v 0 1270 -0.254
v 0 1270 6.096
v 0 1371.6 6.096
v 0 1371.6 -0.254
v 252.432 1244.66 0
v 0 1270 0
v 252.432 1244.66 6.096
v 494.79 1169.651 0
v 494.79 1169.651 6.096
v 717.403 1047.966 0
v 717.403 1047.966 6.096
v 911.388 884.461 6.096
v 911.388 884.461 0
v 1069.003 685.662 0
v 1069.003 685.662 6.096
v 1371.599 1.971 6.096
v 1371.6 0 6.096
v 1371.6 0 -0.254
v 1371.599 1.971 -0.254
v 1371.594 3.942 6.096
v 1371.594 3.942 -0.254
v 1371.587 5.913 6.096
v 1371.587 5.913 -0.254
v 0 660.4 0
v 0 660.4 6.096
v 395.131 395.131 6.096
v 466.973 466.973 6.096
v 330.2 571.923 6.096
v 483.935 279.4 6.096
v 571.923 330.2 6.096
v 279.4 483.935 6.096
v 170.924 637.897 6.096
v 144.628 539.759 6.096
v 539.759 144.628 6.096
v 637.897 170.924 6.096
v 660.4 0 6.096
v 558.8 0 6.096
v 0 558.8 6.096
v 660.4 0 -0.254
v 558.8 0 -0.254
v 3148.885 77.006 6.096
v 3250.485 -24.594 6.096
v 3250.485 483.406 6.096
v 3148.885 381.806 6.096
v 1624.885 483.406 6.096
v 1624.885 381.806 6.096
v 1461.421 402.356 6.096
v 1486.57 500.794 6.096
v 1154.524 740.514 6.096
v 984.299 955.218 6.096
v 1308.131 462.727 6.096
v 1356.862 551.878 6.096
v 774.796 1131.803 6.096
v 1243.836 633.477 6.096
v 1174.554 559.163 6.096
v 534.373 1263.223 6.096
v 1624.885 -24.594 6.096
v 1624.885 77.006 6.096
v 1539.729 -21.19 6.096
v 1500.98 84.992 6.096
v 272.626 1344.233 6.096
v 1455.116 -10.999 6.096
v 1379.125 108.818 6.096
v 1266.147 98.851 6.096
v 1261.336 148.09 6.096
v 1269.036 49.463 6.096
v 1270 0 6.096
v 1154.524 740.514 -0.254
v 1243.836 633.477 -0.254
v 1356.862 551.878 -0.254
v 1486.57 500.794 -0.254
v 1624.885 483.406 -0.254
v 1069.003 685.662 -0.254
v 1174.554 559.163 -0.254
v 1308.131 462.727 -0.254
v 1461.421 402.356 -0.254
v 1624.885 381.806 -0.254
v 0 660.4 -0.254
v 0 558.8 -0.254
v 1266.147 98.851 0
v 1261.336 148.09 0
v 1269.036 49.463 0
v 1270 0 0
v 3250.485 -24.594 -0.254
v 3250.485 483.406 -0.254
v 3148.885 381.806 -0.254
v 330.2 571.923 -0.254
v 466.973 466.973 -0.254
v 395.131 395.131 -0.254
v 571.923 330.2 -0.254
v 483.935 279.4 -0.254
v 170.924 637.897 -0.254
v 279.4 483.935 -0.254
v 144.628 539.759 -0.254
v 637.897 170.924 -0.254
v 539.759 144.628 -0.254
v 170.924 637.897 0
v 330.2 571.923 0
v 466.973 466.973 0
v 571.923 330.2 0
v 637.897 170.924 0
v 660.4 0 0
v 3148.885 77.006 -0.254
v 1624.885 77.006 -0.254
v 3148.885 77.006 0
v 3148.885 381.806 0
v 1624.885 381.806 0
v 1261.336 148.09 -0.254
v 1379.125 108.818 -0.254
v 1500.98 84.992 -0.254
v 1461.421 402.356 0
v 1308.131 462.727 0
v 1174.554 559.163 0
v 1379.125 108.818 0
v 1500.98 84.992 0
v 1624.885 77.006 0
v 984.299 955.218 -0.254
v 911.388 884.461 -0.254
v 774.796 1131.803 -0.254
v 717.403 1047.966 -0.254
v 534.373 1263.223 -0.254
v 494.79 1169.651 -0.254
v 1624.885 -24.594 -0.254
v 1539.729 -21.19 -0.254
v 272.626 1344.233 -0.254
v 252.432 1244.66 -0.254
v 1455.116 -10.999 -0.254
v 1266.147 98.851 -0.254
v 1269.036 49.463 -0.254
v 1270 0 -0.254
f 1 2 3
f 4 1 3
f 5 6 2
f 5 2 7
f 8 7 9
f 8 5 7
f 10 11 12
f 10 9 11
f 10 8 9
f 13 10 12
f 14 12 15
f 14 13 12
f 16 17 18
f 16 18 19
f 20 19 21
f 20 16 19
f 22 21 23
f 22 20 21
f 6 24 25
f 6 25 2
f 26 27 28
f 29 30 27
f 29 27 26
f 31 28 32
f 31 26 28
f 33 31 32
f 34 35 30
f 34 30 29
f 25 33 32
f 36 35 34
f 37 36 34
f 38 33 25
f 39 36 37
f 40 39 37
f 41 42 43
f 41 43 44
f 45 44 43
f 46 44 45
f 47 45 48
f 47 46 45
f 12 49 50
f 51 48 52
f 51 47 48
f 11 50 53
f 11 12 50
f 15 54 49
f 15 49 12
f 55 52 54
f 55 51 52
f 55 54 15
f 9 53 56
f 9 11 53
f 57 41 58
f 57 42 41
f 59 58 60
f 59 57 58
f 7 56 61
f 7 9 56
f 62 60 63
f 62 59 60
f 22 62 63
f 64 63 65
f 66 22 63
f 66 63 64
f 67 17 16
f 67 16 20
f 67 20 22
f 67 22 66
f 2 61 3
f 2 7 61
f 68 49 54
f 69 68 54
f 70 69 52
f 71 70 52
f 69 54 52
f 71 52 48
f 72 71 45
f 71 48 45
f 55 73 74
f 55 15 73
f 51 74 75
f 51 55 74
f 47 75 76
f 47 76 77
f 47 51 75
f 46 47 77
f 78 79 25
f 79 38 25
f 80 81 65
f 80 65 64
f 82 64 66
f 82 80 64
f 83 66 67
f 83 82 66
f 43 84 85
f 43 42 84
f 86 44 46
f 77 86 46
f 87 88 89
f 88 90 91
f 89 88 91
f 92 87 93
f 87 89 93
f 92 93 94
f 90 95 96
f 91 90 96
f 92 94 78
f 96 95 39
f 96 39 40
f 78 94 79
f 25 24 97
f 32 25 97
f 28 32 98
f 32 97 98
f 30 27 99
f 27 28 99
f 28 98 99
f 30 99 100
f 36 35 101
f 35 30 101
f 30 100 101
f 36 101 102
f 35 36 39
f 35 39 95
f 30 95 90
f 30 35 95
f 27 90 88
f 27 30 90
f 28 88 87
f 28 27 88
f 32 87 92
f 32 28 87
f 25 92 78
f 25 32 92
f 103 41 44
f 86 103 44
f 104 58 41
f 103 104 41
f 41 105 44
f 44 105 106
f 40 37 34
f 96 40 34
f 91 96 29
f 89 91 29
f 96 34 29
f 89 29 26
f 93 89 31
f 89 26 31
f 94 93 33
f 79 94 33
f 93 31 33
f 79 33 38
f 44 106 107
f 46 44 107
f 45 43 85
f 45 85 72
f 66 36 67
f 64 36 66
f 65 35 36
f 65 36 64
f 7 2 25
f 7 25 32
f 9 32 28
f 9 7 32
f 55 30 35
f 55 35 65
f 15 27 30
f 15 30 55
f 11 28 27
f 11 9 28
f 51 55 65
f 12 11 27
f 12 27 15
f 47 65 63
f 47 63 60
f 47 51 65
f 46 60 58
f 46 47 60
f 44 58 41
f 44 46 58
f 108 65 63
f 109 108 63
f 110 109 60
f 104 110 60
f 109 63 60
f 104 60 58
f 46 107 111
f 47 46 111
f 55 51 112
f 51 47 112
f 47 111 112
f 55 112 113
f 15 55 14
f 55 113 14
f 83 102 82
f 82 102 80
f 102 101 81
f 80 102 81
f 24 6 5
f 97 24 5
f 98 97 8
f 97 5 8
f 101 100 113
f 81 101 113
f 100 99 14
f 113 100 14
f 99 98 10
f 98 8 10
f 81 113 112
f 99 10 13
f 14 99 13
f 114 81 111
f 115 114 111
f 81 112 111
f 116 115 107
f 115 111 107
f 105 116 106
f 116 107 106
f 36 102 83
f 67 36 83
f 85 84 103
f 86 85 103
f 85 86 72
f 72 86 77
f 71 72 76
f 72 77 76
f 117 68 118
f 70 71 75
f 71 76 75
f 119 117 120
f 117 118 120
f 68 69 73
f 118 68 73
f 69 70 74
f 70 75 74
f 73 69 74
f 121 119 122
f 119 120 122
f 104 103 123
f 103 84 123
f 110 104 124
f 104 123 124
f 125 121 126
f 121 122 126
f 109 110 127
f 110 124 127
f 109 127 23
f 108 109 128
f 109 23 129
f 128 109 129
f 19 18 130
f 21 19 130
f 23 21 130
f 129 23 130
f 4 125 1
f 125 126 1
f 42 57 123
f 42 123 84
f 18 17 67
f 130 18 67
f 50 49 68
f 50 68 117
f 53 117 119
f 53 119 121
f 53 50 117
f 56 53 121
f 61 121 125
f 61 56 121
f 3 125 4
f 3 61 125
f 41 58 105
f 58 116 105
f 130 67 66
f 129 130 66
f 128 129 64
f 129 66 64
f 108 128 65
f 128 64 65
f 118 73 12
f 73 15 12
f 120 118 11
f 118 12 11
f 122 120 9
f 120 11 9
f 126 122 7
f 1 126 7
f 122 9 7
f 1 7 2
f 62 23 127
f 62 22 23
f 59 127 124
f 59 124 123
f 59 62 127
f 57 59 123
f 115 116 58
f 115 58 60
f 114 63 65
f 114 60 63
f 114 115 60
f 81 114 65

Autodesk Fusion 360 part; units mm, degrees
sketch "Sketch1" plane through (0, 0, 0) normal (0, 0, 1) x (1, 0, 0)
  circle A0 centre (0, 0) radius 660.4
  circle A1 centre (0, 0) radius 1270
  line L0 (0, 0) -> (0, 1270)
  line L1 (0, 0) -> (1270, 0)
  circle A2 centre (1624.8851, 1042.2056) radius 660.4
  circle A3 centre (1624.8851, 1042.2056) radius 965.2
  line L2 (1624.8851, 1042.2056) -> (1624.8851, 77.0056)
  line L3 (1624.8851, 77.0056) -> (3148.8851, 77.0056)
  line L4 (3148.8851, 77.0056) -> (3148.8851, 381.8056)
  line L5 (3148.8851, 381.8056) -> (1624.8851, 381.8056)
  line L6 (1624.8851, 381.8056) -> (1624.8851, 77.0056)
  dimension "d1" = 1320.8
  dimension "d2" = 609.6
  dimension "d3" = 1320.8
  dimension "d4" = 304.8
  dimension "d5" = 1524
  dimension "d6" = 304.8
extrude "Extrude1" add sketch "Sketch1" along normal blind 6.096 contours A0 A1 L0 L1 A3 | A1 A3 | A1 A2 A3 L2 L6 | A3 L2 L5 L6 | A3 L3 L4 L5 makes body 1
sketch "Sketch2" plane through (0, 0, 6.096) normal (0, 0, 1) x (-1, 0, 0)
  line L0 (-660.4, 0) -> (-1270, 0)
  arc A0 (-1270, 0) -> (-1261.3364, -148.0897) centre (0, 0) ccw
  arc A1 (-1261.3364, -148.0897) -> (-1624.8851, -77.0056) centre (-1624.8851, -1042.2056) ccw
  line L1 (-1624.8851, -77.0056) -> (-3148.8851, -77.0056)
  line L2 (-3148.8851, -77.0056) -> (-3148.8851, -381.8056)
  line L3 (-3148.8851, -381.8056) -> (-1624.8851, -381.8056)
  arc A2 (-1069.0034, -685.6616) -> (-1624.8851, -381.8056) centre (-1624.8851, -1042.2056) ccw
  arc A3 (-1069.0034, -685.6616) -> (0, -1270) centre (0, 0) ccw
  line L4 (0, -1270) -> (0, -660.4)
  arc A4 (-660.4, 0) -> (0, -660.4) centre (0, 0) ccw
  arc A5 (-549.486, 101.6) -> (101.6, -549.486) centre (0, 0) ccw
  line L5 (101.6, -1367.8319) -> (101.6, -549.486)
  arc A6 (-1154.5236, -740.5145) -> (101.6, -1367.8319) centre (0, 0) ccw
  arc A7 (-1154.5236, -740.5145) -> (-1624.8851, -483.4056) centre (-1624.8851, -1042.2056) ccw
  line L6 (-3250.4851, -483.4056) -> (-1624.8851, -483.4056)
  line L7 (-3250.4851, 24.5944) -> (-3250.4851, -483.4056)
  line L8 (-1624.8851, 24.5944) -> (-3250.4851, 24.5944)
  arc A8 (-1371.5873, -5.913) -> (-1624.8851, 24.5944) centre (-1624.8851, -1042.2056) ccw
  arc A9 (-1367.8319, 101.6) -> (-1371.5873, -5.913) centre (0, 0) ccw
  line L9 (-549.486, 101.6) -> (-1367.8319, 101.6)
  line L10 (-549.486, 101.6) -> (-1383.9809, 101.6)
  line L11 (-1383.9809, 101.6) -> (-1383.9809, 0)
  line L12 (-1383.9809, 0) -> (-549.486, 0)
  line L13 (-549.486, 0) -> (-549.486, 101.6)
  line L14 (101.6, -549.486) -> (0, -549.486)
  line L15 (0, -549.486) -> (0, -1422.4)
  line L16 (0, -1422.4) -> (101.6, -1422.4)
  line L17 (101.6, -1422.4) -> (101.6, -549.486)
  dimension "d9" = 101.6
  dimension "d10" = 101.6
extrude "Extrude1'" add sketch "Sketch2" against normal blind 6.35 separate body contours A4 A5 L12 L15 | A0 A1 L1 L2 L3 A2 A3 A6 A7 L6 L7 L8 A8 A9 L12 L15 makes body 2 at (2674.7518, 9.2723, 6.096) makes body 3 at (31.3282, 624.2927, 6.096) in component "On Ramp"
copy_body "CutPasteBodies1" bodies 1 removing the originals makes body 4 in component "On Ramp"
component "On Ramp" placed x (1, 0, 0) y (0, 1, 0) z (0, 0, 1) at (0, 0, 0)
